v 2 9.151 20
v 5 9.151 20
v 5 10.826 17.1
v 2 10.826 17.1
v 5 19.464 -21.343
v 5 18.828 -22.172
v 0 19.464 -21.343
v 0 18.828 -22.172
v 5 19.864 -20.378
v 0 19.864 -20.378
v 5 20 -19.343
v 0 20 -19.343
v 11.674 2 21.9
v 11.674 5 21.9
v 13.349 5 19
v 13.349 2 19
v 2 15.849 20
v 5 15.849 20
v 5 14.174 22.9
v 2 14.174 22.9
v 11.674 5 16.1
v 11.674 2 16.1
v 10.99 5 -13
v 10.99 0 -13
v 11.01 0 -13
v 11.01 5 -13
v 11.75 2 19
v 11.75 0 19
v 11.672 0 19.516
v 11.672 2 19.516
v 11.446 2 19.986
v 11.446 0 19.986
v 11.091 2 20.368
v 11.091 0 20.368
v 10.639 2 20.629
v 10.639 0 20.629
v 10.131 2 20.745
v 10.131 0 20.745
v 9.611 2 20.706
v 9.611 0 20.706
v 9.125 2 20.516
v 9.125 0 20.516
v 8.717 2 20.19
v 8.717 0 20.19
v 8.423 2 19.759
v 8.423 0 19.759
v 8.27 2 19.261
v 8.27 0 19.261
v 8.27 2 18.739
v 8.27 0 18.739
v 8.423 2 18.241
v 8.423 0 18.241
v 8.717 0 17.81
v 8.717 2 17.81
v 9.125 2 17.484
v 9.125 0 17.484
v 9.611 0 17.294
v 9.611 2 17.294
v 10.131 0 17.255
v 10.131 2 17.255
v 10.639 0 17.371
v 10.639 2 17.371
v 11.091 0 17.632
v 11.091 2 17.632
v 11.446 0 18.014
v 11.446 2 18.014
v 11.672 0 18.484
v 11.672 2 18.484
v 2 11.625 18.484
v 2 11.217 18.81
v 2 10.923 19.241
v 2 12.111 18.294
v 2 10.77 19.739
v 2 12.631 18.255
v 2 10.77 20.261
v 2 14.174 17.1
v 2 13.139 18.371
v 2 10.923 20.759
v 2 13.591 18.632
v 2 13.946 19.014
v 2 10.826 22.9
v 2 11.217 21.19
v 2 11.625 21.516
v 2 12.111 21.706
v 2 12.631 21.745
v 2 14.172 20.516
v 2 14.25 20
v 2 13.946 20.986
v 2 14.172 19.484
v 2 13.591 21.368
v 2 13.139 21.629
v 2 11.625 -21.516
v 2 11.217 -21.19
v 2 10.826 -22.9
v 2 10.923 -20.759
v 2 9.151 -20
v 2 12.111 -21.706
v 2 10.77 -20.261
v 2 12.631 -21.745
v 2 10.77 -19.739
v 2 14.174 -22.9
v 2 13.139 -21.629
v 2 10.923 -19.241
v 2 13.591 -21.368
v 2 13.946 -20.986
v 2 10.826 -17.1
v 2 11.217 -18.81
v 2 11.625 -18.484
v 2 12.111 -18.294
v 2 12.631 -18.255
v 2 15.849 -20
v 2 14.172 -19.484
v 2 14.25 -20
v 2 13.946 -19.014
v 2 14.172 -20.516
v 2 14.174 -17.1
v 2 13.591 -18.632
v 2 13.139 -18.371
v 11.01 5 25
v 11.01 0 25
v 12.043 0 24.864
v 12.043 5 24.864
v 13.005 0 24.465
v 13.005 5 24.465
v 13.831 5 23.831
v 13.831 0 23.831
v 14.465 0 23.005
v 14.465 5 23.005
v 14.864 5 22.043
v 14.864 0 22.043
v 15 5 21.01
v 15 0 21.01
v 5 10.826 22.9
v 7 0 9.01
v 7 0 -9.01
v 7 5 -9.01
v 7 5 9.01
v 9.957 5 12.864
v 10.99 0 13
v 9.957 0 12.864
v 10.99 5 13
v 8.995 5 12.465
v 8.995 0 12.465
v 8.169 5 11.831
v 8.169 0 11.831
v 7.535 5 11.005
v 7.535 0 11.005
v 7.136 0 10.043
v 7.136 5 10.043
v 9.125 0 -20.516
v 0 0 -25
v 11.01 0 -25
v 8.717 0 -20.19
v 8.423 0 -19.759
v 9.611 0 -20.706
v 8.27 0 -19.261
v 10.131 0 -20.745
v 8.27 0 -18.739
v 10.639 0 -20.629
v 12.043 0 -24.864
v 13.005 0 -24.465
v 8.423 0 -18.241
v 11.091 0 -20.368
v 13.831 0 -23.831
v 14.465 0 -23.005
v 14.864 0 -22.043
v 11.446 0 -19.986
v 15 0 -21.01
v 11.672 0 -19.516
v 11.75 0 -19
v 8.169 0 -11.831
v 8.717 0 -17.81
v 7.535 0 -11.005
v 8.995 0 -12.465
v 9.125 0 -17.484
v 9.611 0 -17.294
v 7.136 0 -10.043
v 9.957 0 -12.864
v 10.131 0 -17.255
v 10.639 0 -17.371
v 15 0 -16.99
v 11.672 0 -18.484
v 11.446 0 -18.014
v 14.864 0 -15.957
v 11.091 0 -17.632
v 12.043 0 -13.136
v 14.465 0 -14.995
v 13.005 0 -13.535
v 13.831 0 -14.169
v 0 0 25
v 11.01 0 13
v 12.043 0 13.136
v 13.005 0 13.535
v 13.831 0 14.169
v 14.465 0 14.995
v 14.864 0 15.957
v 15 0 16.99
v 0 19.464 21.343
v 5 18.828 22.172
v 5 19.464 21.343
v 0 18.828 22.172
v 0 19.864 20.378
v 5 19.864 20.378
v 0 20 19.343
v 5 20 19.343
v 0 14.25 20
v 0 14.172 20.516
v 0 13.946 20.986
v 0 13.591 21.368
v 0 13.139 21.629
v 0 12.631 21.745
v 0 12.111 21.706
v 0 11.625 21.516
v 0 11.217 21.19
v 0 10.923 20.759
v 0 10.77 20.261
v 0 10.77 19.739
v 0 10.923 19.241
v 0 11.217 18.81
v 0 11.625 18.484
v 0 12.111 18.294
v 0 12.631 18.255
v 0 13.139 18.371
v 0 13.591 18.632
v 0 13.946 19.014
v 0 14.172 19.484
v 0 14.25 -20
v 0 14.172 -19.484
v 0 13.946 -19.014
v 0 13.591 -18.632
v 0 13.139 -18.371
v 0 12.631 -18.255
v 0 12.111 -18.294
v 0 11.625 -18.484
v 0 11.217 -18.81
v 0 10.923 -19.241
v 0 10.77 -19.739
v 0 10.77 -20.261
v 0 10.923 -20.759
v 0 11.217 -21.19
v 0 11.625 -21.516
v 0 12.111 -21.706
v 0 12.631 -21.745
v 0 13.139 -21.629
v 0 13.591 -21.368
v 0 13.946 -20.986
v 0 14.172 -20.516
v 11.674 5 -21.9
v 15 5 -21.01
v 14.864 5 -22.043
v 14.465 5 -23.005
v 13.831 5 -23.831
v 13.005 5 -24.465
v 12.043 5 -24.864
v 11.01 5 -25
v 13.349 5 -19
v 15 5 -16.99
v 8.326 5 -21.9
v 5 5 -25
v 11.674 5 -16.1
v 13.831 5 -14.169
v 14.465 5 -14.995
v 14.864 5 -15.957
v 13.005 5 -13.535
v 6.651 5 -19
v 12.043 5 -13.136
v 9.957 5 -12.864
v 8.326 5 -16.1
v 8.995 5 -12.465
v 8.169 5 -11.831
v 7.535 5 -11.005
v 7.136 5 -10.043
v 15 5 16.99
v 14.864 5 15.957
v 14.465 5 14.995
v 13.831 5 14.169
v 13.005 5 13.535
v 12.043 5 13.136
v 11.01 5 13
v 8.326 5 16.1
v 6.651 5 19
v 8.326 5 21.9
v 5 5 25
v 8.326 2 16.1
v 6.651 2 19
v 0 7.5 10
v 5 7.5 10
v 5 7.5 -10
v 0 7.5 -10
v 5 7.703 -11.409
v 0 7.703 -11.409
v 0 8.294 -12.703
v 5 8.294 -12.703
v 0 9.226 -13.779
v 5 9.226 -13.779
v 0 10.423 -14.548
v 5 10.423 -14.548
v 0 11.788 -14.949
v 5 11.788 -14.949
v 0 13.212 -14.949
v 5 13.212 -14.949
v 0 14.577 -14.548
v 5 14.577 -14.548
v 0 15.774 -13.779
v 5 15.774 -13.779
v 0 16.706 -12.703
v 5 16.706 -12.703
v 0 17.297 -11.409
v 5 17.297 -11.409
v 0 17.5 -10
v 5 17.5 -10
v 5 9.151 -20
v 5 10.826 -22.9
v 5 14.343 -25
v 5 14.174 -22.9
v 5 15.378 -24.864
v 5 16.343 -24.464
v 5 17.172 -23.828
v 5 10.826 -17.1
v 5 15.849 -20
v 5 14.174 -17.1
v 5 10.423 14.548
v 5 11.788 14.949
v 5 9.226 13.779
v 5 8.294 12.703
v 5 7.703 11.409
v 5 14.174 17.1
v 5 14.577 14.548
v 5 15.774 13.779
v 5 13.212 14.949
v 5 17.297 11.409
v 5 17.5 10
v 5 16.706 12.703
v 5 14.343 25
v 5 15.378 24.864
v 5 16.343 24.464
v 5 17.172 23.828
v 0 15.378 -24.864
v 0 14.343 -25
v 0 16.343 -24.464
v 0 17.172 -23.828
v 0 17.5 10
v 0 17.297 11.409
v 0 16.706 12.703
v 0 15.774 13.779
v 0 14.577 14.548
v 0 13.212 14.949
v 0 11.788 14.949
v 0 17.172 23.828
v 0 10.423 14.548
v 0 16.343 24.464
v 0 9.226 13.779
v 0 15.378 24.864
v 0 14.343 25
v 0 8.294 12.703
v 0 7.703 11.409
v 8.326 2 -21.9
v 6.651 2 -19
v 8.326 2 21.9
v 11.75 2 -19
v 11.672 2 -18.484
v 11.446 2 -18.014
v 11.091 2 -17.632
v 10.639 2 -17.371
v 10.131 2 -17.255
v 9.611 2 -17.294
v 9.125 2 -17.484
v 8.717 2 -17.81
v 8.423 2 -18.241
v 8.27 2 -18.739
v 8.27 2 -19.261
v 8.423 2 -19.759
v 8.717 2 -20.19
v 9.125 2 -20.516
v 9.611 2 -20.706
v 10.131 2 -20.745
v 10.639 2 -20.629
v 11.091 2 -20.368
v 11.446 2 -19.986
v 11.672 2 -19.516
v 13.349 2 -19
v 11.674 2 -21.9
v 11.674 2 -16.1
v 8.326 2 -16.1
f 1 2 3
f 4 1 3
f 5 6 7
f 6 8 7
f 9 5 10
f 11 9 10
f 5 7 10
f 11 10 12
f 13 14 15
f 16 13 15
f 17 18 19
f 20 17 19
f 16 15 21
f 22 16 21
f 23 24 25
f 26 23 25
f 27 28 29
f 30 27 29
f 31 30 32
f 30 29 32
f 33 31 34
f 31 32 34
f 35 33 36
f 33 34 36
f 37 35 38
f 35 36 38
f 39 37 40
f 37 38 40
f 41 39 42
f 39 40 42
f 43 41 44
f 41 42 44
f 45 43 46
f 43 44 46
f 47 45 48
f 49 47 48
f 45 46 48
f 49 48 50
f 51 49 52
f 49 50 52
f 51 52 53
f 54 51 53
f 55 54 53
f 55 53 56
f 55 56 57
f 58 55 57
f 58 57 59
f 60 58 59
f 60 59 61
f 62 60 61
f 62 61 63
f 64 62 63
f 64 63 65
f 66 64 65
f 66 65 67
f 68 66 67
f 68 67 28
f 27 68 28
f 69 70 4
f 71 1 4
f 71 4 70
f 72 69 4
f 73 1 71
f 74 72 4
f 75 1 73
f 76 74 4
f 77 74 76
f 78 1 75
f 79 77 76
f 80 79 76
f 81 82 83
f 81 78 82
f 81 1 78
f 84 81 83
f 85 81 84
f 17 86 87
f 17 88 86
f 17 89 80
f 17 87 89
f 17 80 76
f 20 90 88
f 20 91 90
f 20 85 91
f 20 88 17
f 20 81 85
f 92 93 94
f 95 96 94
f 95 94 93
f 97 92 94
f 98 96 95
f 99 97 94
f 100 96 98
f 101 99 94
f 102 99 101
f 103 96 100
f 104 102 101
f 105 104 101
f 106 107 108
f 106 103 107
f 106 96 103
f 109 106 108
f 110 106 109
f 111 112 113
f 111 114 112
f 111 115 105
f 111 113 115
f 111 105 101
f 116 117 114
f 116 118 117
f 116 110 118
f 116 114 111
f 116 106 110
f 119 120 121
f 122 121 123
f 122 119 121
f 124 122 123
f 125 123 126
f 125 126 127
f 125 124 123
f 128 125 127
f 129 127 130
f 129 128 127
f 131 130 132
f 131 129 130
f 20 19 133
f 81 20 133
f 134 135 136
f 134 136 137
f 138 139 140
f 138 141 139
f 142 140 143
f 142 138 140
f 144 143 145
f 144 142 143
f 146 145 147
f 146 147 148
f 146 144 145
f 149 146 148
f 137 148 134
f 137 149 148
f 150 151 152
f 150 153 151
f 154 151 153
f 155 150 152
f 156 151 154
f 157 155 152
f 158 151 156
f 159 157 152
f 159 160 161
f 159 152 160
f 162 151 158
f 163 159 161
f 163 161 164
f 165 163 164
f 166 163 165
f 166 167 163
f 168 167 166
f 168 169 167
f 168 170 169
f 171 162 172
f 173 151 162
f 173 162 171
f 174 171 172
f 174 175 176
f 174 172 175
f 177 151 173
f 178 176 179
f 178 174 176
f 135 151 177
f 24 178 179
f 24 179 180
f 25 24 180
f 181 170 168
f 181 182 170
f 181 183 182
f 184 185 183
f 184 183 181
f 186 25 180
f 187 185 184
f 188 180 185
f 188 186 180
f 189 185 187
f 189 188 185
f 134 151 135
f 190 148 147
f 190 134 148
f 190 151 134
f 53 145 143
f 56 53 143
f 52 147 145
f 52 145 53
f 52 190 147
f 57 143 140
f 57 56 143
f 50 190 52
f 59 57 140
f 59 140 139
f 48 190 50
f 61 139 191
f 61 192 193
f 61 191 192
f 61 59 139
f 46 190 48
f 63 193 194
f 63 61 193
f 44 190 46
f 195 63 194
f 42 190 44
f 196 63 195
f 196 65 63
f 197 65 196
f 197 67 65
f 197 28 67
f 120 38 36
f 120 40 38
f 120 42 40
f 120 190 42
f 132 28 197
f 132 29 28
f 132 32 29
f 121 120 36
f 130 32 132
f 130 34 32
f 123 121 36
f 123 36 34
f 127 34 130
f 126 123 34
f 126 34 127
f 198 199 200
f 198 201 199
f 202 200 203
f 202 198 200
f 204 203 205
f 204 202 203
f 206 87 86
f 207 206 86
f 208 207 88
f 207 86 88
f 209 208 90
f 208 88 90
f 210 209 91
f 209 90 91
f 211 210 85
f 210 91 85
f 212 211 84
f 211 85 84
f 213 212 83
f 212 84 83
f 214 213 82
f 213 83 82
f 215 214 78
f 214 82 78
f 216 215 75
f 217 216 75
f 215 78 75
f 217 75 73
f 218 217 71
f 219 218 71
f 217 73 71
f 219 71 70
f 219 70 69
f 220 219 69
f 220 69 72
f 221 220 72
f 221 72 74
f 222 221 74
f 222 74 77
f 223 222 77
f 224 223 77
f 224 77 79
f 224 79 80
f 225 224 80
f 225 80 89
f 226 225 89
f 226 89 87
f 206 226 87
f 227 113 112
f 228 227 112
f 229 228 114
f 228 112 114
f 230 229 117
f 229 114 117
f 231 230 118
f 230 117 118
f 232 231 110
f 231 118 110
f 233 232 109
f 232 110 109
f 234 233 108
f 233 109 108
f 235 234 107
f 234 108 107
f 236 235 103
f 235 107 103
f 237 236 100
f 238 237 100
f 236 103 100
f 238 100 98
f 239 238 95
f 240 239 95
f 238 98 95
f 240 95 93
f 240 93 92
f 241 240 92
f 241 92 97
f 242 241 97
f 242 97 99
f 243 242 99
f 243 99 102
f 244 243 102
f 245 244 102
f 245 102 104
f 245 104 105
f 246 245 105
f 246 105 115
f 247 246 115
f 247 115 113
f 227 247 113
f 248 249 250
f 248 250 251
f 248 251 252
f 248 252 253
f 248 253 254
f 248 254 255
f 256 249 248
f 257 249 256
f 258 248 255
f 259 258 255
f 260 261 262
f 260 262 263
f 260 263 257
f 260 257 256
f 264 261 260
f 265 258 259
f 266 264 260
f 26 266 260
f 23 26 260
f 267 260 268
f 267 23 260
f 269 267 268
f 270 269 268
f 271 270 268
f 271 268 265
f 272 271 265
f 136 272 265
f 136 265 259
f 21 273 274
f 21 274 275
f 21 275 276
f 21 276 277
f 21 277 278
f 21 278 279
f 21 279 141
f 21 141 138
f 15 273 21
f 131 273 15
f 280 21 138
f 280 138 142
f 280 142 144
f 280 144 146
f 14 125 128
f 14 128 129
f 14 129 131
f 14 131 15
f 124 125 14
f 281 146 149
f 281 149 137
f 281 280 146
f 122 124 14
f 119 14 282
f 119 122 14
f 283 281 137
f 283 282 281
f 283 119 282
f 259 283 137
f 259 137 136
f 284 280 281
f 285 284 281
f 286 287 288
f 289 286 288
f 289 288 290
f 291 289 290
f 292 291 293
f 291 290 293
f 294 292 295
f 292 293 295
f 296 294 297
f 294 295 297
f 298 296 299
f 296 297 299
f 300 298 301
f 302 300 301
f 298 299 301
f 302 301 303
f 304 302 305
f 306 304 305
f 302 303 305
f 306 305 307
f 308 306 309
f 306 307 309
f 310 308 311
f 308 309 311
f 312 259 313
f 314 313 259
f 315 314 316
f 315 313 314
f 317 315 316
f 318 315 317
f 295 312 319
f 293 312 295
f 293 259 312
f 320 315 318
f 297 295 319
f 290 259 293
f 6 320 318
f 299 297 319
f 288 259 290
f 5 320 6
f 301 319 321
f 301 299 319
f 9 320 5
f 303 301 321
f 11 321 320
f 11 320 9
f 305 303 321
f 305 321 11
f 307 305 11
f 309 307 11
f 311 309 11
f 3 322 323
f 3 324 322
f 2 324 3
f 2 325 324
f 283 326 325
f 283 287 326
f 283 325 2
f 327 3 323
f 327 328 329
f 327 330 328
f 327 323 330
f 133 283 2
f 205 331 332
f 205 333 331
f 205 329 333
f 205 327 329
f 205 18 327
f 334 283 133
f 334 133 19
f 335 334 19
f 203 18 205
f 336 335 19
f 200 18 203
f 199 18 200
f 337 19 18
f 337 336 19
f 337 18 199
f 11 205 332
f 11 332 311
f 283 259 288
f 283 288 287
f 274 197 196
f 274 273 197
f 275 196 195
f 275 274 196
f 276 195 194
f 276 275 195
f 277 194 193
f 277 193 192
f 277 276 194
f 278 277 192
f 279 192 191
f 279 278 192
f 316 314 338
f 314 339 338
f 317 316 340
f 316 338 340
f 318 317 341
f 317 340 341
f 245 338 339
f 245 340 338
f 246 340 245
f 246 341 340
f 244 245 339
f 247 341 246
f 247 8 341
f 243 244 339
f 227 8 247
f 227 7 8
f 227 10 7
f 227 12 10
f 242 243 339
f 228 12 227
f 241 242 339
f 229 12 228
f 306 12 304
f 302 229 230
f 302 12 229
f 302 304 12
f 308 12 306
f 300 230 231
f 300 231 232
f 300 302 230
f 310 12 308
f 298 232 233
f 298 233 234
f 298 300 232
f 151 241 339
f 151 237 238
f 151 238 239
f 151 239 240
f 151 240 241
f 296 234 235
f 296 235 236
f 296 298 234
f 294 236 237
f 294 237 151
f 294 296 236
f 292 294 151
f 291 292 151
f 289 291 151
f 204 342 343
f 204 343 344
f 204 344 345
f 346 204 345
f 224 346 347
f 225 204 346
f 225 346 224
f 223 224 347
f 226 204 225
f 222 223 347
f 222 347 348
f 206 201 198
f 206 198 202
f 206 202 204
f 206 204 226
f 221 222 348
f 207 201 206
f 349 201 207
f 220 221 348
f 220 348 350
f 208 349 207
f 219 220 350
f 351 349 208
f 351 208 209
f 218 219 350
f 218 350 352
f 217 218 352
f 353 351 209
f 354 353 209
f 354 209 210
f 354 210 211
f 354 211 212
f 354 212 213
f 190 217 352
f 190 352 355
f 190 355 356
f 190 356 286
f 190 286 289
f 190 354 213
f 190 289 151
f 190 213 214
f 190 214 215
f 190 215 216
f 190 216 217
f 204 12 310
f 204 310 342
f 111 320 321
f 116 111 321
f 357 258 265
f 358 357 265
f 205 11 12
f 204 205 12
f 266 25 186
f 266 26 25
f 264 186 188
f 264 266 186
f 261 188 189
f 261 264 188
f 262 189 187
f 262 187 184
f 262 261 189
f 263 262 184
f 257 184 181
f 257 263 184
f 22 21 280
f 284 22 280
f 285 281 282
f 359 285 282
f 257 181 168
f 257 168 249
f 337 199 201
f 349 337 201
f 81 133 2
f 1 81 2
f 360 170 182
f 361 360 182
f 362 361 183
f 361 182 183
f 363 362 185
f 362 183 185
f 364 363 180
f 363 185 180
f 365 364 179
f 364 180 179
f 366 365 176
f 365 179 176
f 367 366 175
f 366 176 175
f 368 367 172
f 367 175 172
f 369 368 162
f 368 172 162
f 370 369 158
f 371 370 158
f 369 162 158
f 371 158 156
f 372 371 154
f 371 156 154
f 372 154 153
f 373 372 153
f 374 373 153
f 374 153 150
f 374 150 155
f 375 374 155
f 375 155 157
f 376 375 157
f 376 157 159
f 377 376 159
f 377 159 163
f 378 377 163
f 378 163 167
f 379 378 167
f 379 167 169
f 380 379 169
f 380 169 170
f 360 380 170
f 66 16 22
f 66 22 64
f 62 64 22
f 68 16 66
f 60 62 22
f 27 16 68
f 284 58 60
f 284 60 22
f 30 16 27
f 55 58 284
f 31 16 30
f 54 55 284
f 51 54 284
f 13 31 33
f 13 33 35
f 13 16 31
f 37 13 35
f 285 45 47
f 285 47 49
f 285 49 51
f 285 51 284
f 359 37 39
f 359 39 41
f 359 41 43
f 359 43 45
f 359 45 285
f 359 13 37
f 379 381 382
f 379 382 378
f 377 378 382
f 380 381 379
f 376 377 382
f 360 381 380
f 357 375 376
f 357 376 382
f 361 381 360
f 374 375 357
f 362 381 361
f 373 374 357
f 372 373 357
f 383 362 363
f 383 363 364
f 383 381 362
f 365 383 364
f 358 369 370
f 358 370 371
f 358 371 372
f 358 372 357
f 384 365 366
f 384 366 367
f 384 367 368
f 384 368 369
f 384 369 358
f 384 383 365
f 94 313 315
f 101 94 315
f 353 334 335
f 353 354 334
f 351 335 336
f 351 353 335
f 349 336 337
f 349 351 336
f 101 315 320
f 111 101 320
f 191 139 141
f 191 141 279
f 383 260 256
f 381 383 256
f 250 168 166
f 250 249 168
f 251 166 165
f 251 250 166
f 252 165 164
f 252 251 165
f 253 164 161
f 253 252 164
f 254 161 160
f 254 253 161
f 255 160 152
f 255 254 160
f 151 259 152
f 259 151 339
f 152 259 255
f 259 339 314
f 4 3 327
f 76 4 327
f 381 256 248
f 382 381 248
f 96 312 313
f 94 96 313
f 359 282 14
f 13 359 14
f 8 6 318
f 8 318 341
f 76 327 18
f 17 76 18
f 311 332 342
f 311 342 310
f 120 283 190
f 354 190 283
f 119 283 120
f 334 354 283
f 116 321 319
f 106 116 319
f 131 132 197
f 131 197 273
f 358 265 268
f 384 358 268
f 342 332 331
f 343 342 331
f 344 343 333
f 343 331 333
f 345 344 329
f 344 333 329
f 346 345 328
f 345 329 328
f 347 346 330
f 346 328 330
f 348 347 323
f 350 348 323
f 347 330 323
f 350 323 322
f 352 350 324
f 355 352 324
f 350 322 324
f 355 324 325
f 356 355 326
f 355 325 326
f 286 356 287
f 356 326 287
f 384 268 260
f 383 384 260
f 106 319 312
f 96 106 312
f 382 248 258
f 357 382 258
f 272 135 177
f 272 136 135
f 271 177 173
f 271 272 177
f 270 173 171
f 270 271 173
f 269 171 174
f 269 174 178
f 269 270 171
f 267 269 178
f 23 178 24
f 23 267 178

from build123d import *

# Parameters (mm, degrees)
PAD_DEPTH       = 25
SKETCH001_R     = 1.75
POCKET_DEPTH    = 5.001
POCKET001_DEPTH = 3
SKETCH003_R     = 1.75
SKETCH003_W     = 12
SKETCH003_H     = 26
POCKET002_DEPTH = 20.001
POCKET003_DEPTH = 3
FILLET_R        = 3.99
POCKET004_DEPTH = 5.001
CHAMFER_SIZE    = 4
FILLET001_R     = 4


with BuildPart() as part:
    # Sketch → Pad (new body, symmetric)
    with BuildSketch(Plane.XY):
        Polygon((0, 0), (15, 0), (15, 5), (5, 5), (5, 20), (0, 20), align=None)
    extrude(amount=PAD_DEPTH, both=True)

    # Sketch001 (on Face4 of Pad) → Pocket (cut, through all)
    with BuildSketch(Plane.YZ.offset(5)):
        with Locations((12.5, 20)):
            Circle(SKETCH001_R)
        with Locations((12.5, -20)):
            Circle(SKETCH001_R)
    extrude(amount=-POCKET_DEPTH, mode=Mode.SUBTRACT)

    # Sketch002 (on Face10 of Pocket) → Pocket001 (cut)
    with BuildSketch(Plane.YZ.offset(5)):
        Polygon((14.174316, 17.1), (15.848632, 20), (14.174316, 22.9), (10.825684, 22.9), (9.151368, 20), (10.825684, 17.1), align=None)
        Polygon((14.174316, -22.9), (15.848632, -20), (14.174316, -17.1), (10.825684, -17.1), (9.151368, -20), (10.825684, -22.9), align=None)
    extrude(amount=-POCKET001_DEPTH, mode=Mode.SUBTRACT)

    # Sketch003 (on Face1 of Pocket001) → Pocket002 (cut, through all)
    with BuildSketch(Plane.XZ):
        with Locations((10, 19)):
            Circle(SKETCH003_R)
        with Locations((10, -19)):
            Circle(SKETCH003_R)
        with Locations((13, 0)):
            Rectangle(SKETCH003_W, SKETCH003_H)
    extrude(amount=-POCKET002_DEPTH, mode=Mode.SUBTRACT)

    # Sketch004 (on Face12 of Pocket002) → Pocket003 (cut)
    with BuildSketch(Plane(origin=(0, 5, 0), x_dir=(-1, 0, 0), z_dir=(0, 1, 0))):
        Polygon((-6.651368, 19), (-8.325684, 21.9), (-11.674316, 21.9), (-13.348632, 19), (-11.674316, 16.1), (-8.325684, 16.1), align=None)
        Polygon((-6.651368, -19), (-8.325684, -16.1), (-11.674316, -16.1), (-13.348632, -19), (-11.674316, -21.9), (-8.325684, -21.9), align=None)
    extrude(amount=-POCKET003_DEPTH, mode=Mode.SUBTRACT)

    # Fillet
    fillet_edges = [part.edges().sort_by_distance(p)[0] for p in [
        (15, 2.5, -25),
        (15, 2.5, -13),
        (7, 2.5, -13),
        (7, 2.5, 13),
        (15, 2.5, 13),
        (15, 2.5, 25),
    ]]
    fillet(fillet_edges, radius=FILLET_R)

    # Sketch005 (on Face20 of Fillet) → Pocket004 (cut, through all)
    with BuildSketch(Plane.YZ.offset(5)):
        with BuildLine():
            ThreePointArc((17.5, 10), (12.5, 15), (7.5, 10))
            Line((7.5, 10), (7.5, -10))
            ThreePointArc((7.5, -10), (12.5, -15), (17.5, -10))
            Line((17.5, 10), (17.5, -10))
        make_face()
    extrude(amount=-POCKET004_DEPTH, mode=Mode.SUBTRACT)

    # Chamfer
    chamfer_edges = [part.edges().sort_by_distance(p)[0] for p in [
        (2.5, 20, -25),
        (2.5, 20, 25),
    ]]
    chamfer(chamfer_edges, length=CHAMFER_SIZE)

    # Fillet001
    fillet001_edges = [part.edges().sort_by_distance(p)[0] for p in [
        (2.5, 20, -21),
        (2.5, 20, 21),
        (2.5, 16, -25),
        (2.5, 16, 25),
    ]]
    fillet(fillet001_edges, radius=FILLET001_R)


solid = part.part
